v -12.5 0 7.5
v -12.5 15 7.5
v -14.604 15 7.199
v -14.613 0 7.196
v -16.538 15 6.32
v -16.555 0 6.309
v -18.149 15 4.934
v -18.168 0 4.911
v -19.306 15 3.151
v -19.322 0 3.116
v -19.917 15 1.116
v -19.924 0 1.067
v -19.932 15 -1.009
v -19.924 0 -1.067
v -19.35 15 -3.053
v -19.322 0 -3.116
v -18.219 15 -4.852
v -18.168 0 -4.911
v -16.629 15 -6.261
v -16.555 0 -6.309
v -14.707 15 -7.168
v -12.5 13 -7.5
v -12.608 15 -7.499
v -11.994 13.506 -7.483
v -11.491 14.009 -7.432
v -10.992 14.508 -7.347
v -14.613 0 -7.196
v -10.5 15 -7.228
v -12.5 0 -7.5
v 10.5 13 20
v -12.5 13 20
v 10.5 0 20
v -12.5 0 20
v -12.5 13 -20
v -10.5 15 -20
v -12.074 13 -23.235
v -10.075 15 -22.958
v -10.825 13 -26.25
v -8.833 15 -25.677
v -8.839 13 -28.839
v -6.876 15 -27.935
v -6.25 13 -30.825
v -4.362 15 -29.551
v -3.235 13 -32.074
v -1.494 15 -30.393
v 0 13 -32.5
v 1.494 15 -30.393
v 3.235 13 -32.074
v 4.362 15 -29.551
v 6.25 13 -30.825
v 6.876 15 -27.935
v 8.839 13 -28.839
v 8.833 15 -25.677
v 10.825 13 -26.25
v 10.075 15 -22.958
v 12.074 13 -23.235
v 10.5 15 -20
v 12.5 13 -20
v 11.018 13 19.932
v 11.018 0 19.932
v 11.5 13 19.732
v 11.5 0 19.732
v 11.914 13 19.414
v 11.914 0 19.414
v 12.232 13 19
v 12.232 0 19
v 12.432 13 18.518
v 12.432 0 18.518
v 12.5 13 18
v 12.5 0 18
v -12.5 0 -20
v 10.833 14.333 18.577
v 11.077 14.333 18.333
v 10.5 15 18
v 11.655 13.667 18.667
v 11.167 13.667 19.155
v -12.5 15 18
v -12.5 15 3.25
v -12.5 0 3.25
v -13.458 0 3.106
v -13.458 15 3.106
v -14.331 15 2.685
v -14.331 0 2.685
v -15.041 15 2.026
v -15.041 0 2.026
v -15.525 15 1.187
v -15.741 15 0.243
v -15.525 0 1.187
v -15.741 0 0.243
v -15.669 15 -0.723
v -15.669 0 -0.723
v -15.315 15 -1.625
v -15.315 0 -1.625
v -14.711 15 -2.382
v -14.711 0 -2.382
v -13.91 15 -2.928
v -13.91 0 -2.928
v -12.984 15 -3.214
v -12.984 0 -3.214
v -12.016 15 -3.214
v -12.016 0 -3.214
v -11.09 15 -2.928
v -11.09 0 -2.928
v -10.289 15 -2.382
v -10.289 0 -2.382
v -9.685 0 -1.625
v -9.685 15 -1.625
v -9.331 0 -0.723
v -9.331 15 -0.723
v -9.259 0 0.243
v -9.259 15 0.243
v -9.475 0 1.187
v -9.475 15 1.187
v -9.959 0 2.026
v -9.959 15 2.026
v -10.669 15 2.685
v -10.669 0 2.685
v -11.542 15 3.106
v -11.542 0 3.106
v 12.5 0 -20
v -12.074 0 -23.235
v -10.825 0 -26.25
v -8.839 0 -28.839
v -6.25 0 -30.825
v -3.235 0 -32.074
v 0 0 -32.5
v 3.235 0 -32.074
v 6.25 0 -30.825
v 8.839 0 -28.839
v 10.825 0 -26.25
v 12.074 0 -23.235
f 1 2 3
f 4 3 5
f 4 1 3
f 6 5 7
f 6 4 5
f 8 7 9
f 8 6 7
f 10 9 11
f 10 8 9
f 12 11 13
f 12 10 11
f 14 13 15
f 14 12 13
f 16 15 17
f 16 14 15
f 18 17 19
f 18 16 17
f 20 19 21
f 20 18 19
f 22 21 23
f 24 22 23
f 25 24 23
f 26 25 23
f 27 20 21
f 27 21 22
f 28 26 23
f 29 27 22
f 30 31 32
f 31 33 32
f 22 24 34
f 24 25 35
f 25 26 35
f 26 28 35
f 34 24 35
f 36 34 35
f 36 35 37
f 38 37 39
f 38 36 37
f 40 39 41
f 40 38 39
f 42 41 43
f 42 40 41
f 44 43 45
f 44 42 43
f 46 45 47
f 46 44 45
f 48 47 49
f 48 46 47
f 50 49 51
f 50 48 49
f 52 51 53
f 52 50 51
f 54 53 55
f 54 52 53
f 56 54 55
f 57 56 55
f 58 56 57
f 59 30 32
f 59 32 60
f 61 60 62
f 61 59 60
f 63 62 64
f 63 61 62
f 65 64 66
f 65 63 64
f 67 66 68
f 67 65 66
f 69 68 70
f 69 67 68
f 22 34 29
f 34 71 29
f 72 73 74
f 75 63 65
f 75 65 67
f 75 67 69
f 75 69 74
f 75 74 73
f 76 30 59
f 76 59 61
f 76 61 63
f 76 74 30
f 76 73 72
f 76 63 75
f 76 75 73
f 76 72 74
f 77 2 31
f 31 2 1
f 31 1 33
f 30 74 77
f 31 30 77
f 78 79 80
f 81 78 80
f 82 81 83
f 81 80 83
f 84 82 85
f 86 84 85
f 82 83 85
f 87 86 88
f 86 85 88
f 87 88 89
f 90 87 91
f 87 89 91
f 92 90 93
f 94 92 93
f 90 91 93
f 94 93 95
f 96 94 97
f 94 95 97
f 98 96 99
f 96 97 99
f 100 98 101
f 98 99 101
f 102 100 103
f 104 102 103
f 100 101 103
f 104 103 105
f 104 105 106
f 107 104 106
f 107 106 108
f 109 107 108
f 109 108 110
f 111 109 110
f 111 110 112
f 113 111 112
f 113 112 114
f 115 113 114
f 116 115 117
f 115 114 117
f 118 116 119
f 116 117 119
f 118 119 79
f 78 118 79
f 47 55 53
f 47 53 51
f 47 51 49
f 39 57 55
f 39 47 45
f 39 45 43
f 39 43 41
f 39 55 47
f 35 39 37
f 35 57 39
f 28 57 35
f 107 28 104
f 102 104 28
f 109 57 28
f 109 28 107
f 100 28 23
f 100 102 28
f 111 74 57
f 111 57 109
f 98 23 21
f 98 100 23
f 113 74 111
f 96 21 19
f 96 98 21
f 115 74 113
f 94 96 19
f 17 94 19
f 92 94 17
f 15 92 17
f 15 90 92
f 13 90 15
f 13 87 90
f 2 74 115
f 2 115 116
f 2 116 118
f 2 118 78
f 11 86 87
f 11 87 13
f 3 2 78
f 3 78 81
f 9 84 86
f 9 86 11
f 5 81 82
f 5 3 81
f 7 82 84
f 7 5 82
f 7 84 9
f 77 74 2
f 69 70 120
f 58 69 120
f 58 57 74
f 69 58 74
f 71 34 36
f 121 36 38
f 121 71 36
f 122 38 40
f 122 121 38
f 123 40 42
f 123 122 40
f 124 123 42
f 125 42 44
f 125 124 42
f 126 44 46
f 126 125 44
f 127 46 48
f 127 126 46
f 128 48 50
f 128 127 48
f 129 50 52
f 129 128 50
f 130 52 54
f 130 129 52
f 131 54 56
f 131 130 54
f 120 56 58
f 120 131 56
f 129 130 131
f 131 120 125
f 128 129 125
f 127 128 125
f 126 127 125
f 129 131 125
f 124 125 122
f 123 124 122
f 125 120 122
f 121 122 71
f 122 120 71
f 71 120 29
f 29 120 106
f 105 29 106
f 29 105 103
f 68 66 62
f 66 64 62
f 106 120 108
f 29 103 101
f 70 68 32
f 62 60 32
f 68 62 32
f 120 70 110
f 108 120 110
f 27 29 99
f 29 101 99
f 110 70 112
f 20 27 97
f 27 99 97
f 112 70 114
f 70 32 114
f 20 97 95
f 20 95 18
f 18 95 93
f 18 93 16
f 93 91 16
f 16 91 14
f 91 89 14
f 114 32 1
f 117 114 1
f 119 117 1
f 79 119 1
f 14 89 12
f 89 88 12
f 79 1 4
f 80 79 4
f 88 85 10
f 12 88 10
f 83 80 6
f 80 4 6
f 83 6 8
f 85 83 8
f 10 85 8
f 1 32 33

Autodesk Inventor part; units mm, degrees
ref_plane "YZ Plane" through (0, 0, 0) normal (1, 0, 0) x (0, 1, 0)
ref_plane "XZ Plane" through (0, 0, 0) normal (0, 1, 0) x (-1, 0, 0)
ref_plane "XY Plane" through (0, 0, 0) normal (0, 0, 1) x (1, 0, 0)
sketch "Sketch1" plane through (0, 0, 0) normal (0, 1, 0) x (-1, 0, 0)
  line L0 (-12.5, -20) -> (12.5, -20)
  line L1 (12.5, -20) -> (12.5, 20)
  line L2 (12.5, 20) -> (-12.5, 20)
  line L3 (-12.5, 20) -> (-12.5, -20)
  line L4 (-12.5, -20) -> (12.5, 20) construction
  line L5 (12.5, -20) -> (-12.5, 20) construction
  circle A0 centre (0, -20) radius 12.5
  circle A1 centre (12.5, 0) radius 7.5
  point P0 (0, 0)
  point P1 (12.5, -7.5)
  point P2 (12.5, 7.5)
  dimension "d0" = 25
  dimension "d1" = 40
  dimension "d2" = 15
extrude "Extrusion1" add sketch "Sketch1" along normal blind 15
fillet "Fillet1" radius 2 1 edges at (12.5, 7.5, 20)
chamfer "Chamfer1" distance 2 angle 45 5 edges at (-1, 15, 20) (11.9142, 15, 19.4142) (12.5, 15, -1) (0, 15, -32.5) (-12.5, 15, -13.75)
sketch "Sketch2" plane through (0, 15, 0) normal (0, 1, 0) x (1, 0, 0)
  arc A0 (-10.5, 7.2284) -> (-12.5, -7.5) centre (-12.5, 0) ccw projected
  point P0 (0, 0)
hole "Hole1" at (-12.5, 15, 0) direction (0, -1, 0) diameter 6.5 end through all
equation "\"d3\" = d2"
properties part number "SampleComplexPart"
